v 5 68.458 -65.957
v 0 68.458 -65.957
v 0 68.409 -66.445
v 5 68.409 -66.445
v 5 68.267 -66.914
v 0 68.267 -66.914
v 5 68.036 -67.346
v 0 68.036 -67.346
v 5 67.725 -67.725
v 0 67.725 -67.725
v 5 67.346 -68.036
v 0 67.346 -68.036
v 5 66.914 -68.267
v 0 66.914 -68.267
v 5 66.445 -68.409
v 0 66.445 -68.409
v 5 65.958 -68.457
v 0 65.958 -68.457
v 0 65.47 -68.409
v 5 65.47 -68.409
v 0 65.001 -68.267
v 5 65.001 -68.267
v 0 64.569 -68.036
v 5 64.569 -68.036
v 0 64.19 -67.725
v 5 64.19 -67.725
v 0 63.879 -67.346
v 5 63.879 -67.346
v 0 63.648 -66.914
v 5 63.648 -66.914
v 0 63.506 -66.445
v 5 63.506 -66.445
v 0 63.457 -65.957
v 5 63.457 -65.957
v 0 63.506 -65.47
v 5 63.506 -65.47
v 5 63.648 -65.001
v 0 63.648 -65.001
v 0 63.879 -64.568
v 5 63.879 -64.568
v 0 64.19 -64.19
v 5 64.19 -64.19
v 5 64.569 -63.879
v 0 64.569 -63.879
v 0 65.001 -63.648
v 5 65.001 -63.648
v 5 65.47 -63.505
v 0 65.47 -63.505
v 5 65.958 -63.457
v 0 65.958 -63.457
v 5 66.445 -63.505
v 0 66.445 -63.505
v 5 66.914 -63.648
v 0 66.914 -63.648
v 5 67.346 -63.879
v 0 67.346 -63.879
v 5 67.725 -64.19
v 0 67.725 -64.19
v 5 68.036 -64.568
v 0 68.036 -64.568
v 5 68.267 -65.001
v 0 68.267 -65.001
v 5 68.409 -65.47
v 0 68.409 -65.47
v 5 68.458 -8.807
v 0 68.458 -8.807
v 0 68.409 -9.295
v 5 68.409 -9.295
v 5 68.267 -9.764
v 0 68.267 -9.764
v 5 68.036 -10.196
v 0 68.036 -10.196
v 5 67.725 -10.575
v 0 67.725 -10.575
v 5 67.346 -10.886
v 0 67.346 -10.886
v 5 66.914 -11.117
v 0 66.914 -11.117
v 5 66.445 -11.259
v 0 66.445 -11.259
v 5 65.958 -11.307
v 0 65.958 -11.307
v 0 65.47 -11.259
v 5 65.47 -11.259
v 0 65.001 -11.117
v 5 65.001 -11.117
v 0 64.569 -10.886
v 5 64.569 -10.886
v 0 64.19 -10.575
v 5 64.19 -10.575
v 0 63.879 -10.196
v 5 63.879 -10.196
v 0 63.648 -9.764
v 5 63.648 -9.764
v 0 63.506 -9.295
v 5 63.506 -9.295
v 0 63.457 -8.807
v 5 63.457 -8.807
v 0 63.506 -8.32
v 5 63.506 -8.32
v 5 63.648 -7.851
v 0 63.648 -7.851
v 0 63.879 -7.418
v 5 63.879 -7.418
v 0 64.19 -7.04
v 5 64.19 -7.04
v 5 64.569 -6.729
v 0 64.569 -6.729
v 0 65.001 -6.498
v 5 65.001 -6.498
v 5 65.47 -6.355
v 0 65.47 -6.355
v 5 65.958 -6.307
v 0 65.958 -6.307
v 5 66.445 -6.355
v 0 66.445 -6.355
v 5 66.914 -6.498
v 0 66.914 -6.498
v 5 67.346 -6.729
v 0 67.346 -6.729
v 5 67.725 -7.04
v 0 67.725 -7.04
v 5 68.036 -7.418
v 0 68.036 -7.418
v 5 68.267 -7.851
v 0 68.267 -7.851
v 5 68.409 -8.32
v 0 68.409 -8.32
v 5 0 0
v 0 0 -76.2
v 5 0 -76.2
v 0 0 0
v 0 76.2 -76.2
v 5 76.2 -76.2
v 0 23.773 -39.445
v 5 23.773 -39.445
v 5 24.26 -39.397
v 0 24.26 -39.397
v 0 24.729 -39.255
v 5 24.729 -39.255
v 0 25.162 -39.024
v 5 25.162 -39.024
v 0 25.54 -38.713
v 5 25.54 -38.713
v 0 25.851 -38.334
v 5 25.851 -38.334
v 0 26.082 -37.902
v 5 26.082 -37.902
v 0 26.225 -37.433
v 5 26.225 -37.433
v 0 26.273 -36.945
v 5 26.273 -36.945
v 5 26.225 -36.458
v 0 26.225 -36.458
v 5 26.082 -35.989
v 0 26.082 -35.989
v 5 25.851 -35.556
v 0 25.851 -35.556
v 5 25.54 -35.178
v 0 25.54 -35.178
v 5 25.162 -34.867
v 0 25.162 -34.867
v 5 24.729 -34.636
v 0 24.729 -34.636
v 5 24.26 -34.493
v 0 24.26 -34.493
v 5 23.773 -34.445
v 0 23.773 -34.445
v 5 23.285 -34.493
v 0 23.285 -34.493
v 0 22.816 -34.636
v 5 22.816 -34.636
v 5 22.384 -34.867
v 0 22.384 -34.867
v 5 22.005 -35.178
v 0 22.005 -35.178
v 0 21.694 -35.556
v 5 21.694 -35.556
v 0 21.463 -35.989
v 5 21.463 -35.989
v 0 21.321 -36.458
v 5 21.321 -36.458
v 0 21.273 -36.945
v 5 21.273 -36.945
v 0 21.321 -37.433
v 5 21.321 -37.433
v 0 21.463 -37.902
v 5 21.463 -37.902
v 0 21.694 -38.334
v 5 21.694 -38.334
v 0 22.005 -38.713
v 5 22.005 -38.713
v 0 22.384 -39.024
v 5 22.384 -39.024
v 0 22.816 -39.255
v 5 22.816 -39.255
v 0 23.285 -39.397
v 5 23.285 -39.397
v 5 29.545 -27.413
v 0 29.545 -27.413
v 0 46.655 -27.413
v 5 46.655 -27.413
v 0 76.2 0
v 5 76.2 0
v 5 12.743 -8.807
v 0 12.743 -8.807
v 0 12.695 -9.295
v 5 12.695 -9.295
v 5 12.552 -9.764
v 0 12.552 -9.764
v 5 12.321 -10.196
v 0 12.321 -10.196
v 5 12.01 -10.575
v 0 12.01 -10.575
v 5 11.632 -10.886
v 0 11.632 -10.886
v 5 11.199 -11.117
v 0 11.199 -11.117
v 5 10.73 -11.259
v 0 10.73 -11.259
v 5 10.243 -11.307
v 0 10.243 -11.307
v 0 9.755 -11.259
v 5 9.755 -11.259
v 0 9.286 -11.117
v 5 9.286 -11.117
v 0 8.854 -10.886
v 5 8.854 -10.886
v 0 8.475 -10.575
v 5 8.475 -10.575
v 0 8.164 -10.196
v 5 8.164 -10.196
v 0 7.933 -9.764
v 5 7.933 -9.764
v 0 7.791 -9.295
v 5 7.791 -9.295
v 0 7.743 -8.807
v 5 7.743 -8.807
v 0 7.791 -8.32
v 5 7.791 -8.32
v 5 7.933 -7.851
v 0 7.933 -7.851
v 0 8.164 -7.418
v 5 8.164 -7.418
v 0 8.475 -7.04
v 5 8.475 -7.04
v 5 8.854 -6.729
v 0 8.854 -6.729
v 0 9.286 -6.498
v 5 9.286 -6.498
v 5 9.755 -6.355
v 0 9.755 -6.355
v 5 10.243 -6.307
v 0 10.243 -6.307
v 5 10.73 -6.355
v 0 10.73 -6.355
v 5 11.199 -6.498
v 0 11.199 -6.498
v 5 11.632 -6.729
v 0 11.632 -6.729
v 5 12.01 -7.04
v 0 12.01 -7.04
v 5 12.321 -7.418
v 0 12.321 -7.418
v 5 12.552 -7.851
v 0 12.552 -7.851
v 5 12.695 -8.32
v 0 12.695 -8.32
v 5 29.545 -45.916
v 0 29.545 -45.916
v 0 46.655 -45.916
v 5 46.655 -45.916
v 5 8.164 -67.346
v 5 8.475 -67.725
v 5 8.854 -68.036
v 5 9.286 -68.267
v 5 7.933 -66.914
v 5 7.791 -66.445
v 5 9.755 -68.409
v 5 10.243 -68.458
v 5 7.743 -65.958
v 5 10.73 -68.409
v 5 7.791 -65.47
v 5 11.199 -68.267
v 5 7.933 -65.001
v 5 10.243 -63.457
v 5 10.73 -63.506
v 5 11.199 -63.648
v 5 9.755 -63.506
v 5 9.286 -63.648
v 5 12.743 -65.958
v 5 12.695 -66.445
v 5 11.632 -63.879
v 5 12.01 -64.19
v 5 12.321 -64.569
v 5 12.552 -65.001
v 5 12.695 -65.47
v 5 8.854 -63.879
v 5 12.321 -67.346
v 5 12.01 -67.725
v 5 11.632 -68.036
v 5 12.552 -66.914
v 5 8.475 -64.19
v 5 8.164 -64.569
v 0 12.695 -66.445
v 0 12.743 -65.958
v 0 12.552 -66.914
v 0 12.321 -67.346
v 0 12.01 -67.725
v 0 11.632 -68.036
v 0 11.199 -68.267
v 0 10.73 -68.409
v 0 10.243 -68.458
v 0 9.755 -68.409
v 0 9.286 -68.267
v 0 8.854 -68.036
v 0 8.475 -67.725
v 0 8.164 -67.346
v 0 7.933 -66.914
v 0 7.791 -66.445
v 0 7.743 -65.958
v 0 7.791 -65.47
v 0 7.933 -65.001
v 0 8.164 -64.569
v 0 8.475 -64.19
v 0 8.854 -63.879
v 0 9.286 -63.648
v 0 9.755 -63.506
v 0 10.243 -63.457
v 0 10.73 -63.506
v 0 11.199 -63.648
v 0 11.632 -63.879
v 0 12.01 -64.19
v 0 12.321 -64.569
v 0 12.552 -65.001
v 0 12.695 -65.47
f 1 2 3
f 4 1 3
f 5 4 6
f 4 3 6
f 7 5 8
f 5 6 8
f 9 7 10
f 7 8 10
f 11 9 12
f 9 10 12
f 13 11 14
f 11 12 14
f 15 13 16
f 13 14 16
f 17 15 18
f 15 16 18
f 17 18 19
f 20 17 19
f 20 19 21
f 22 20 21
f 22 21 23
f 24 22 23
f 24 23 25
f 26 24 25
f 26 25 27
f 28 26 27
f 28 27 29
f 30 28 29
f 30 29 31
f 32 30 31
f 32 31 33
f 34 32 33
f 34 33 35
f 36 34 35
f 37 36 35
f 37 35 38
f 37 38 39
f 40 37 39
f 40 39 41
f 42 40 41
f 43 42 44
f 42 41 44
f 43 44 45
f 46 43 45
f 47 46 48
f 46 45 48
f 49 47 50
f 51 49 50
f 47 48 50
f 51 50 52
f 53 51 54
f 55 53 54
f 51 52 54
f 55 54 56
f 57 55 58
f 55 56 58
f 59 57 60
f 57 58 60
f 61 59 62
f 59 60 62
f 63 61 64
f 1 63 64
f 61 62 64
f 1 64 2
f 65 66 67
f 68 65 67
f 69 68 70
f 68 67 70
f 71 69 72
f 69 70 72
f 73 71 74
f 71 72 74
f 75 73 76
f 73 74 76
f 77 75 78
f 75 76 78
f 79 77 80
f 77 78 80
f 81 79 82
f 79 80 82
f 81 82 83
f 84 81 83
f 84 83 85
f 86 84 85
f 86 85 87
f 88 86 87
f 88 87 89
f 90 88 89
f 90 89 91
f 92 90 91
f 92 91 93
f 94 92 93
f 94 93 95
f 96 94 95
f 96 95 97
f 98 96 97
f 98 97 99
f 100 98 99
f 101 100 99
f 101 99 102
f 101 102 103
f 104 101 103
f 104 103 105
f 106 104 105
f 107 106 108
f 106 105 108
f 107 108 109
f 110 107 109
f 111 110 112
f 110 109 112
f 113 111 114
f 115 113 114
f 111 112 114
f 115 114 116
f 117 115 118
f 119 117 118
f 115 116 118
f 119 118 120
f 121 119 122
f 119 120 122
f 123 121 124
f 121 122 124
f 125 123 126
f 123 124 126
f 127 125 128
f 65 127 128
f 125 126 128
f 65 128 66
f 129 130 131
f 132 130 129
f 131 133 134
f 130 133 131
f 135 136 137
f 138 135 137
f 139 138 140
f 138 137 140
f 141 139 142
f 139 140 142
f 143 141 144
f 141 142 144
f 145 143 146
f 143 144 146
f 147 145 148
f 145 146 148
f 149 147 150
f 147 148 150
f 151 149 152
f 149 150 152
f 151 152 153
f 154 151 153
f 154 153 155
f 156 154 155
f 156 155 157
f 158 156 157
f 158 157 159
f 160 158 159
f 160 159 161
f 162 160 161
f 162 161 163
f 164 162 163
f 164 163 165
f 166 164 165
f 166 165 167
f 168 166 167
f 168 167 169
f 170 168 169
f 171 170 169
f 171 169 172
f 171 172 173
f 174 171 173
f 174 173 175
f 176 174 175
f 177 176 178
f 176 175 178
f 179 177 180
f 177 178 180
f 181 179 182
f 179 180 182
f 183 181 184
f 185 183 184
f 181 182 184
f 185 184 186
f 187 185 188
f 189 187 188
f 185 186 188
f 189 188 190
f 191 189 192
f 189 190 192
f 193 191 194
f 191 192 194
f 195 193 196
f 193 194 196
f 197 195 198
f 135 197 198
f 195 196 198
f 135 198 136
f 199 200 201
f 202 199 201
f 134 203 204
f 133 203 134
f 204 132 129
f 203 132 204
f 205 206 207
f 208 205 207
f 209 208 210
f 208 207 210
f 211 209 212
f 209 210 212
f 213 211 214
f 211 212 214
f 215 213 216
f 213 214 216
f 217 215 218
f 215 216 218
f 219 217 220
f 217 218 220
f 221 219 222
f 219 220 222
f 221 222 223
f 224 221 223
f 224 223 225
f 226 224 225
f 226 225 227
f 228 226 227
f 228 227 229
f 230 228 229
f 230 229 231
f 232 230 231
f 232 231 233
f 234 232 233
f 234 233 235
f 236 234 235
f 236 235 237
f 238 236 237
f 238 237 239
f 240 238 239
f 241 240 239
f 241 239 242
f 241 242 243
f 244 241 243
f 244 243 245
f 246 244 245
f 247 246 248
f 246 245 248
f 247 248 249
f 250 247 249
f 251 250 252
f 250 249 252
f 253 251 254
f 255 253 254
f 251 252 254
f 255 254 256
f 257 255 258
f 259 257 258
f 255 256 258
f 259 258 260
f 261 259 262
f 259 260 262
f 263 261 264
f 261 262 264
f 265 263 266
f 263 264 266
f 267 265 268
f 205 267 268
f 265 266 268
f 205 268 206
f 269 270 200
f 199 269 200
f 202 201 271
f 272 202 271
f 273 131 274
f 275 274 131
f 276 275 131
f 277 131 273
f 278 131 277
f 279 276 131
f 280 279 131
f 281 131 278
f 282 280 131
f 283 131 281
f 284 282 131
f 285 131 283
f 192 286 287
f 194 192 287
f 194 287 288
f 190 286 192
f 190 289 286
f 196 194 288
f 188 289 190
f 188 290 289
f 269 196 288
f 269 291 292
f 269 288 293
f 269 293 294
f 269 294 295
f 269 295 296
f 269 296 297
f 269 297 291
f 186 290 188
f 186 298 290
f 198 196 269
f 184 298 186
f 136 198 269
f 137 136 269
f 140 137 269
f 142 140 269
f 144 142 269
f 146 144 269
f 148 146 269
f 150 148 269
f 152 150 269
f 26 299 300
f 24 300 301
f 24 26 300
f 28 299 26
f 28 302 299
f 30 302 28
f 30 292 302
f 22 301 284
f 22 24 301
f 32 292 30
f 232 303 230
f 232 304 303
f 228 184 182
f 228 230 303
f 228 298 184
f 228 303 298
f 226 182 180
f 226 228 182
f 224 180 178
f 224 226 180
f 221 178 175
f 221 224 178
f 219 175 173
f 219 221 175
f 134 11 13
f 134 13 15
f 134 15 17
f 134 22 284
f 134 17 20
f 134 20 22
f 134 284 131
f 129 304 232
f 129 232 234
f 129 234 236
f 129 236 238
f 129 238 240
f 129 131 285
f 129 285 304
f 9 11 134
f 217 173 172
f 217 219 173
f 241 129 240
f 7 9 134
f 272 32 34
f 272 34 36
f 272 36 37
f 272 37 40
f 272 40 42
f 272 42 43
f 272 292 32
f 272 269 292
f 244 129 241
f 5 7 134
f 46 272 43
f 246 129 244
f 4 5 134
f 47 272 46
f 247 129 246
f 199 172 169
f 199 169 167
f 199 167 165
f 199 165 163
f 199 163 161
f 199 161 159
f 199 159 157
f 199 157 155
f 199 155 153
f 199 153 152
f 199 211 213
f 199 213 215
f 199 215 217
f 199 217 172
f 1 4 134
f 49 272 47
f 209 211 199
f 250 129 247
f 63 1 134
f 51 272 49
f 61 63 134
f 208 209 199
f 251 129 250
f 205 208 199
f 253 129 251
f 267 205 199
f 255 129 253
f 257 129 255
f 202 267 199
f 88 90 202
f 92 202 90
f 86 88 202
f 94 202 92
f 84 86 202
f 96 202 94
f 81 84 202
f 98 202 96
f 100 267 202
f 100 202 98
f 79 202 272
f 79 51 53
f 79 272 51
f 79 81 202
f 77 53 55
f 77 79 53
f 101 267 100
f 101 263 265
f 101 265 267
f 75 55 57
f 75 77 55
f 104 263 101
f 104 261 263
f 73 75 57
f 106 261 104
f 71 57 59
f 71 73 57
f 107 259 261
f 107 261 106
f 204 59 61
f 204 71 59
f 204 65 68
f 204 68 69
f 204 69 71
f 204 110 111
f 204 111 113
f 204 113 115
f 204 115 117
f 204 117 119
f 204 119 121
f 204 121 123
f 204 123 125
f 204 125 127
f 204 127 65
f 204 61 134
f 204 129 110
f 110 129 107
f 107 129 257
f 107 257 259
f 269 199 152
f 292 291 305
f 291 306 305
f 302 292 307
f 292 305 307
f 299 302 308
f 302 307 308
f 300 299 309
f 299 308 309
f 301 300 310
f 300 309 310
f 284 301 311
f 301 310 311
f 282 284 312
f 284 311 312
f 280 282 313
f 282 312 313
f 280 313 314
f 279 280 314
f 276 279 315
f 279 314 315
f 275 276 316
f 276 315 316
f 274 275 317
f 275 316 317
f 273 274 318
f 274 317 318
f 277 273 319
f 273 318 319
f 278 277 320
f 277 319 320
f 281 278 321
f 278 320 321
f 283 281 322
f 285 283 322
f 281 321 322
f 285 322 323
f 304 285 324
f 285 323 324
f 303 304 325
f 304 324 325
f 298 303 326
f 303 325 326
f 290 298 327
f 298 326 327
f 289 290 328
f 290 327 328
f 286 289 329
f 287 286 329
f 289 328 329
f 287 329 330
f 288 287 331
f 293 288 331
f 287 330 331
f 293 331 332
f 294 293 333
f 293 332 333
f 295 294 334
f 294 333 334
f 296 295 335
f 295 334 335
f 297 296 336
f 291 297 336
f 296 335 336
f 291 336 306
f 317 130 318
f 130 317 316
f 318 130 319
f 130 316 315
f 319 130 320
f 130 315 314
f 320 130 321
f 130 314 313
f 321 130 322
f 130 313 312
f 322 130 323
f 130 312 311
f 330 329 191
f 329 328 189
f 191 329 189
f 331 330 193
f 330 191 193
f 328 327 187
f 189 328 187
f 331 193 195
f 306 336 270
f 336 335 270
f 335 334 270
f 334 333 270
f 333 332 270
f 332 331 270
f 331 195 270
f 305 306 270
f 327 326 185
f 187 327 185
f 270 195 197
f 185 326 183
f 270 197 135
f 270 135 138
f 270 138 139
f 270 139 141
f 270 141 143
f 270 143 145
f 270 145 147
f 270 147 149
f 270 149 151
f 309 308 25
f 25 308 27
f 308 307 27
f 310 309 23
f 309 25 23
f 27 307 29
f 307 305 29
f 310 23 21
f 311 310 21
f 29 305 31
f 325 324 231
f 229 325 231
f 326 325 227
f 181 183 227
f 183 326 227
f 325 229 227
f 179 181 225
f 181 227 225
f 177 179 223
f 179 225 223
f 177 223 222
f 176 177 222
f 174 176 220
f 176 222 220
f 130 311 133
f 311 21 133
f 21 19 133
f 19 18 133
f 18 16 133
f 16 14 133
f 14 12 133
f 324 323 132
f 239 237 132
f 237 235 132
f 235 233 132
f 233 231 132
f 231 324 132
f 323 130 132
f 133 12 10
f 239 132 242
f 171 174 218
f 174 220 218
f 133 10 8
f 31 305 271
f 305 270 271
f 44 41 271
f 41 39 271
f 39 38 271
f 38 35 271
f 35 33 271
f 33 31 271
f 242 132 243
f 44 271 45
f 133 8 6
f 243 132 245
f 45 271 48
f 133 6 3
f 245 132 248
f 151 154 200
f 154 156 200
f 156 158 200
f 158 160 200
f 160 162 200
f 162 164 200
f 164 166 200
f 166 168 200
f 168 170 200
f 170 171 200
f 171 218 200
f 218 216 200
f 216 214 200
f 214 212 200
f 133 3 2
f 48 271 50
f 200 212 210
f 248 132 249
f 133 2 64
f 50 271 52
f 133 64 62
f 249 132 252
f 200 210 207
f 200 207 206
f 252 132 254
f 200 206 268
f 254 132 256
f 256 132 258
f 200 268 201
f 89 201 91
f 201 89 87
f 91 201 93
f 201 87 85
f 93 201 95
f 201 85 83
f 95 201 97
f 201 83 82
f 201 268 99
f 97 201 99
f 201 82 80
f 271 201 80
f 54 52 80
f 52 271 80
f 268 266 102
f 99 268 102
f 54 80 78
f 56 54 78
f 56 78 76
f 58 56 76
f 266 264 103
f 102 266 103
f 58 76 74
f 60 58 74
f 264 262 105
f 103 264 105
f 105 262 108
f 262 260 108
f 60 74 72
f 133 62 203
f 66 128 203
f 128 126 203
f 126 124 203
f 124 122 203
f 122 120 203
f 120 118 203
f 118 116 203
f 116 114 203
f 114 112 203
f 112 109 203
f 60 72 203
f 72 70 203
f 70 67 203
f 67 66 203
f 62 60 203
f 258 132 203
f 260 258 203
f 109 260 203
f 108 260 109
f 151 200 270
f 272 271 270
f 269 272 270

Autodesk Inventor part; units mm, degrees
ref_plane "YZ Plane" through (0, 0, 0) normal (1, 0, 0) x (0, 1, 0)
ref_plane "XZ Plane" through (0, 0, 0) normal (0, 1, 0) x (-1, 0, 0)
ref_plane "XY Plane" through (0, 0, 0) normal (0, 0, 1) x (1, 0, 0)
sketch "Sketch1" plane through (0, 0, 0) normal (1, 0, 0) x (0, 1, 0)
  line L0 (0, 0) -> (76.2, 0)
  line L1 (76.2, 0) -> (76.2, -76.2)
  line L2 (76.2, -76.2) -> (0, -76.2)
  line L3 (0, -76.2) -> (0, 0)
  line L4 (20.4851, -17.6149) -> (55.7149, -17.6149)
  line L5 (55.7149, -17.6149) -> (55.7149, -55.7149)
  line L6 (55.7149, -55.7149) -> (20.4851, -55.7149)
  line L7 (20.4851, -55.7149) -> (20.4851, -17.6149)
  line L8 (20.4851, -17.6149) -> (55.7149, -55.7149) construction
  line L9 (55.7149, -17.6149) -> (20.4851, -55.7149) construction
  line L10 (76.2, 0) -> (55.7149, -17.6149)
  line L11 (20.4851, -55.7149) -> (0, -76.2)
  line L12 (0, 0) -> (20.4851, -17.6149)
  line L13 (55.7149, -55.7149) -> (76.2, -76.2)
  circle A0 centre (65.9575, -8.8074) radius 2.5
  circle A1 centre (65.9575, -65.9574) radius 2.5
  circle A2 centre (10.2426, -65.9575) radius 2.5
  circle A3 centre (10.2426, -8.8074) radius 2.5
  line L14 (29.5453, -27.4133) -> (46.6547, -27.4133)
  line L15 (46.6547, -27.4133) -> (46.6547, -45.9165)
  line L16 (46.6547, -45.9165) -> (29.5453, -45.9165)
  line L17 (29.5453, -45.9165) -> (29.5453, -27.4133)
  line L18 (29.5453, -27.4133) -> (46.6547, -45.9165) construction
  line L19 (46.6547, -27.4133) -> (29.5453, -45.9165) construction
  point P0 (38.1, -36.6649)
  dimension "d0" = 76.2
  dimension "d1" = 76.2
  dimension "d2" = 35.2298
  dimension "d3" = 38.1
  dimension "d4" = 5
  dimension "d5" = 5
  dimension "d6" = 5
  dimension "d7" = 5
  dimension "d8" = 49.308
  dimension "d9" = 29.5453
extrude "Extrusion1" add sketch "Sketch1" along normal blind 5
extrude "Extrusion2" cut sketch "Sketch1" along normal blind 5 contours A3 L12 | L12 A3 | A0 L10 | L10 A0 | A2 L11 | L11 A2 | A1 L13 | L13 A1
sketch "Sketch2" plane through (5, 0, 0) normal (1, 0, 0) x (0, 0, -1)
  line L0 (76.2, 0) -> (76.2, 76.2) projected
  line L1 (27.4133, 29.5453) -> (76.2, 0)
  line L2 (45.9165, 29.5453) -> (0, 0)
  circle A0 centre (36.9453, 23.7727) radius 2.5
  line L3 (36.9453, 23.7727) -> (36.9453, 0)
  dimension "d14" = 5
  dimension "d19" = 23.7727
extrude "Extrusion3" cut sketch "Sketch2" against normal blind 25.4
thread "Thread1" size "M1x0.25" class "6H" standard "ISO Metric profile" full length
properties part number "plateform du bas"
